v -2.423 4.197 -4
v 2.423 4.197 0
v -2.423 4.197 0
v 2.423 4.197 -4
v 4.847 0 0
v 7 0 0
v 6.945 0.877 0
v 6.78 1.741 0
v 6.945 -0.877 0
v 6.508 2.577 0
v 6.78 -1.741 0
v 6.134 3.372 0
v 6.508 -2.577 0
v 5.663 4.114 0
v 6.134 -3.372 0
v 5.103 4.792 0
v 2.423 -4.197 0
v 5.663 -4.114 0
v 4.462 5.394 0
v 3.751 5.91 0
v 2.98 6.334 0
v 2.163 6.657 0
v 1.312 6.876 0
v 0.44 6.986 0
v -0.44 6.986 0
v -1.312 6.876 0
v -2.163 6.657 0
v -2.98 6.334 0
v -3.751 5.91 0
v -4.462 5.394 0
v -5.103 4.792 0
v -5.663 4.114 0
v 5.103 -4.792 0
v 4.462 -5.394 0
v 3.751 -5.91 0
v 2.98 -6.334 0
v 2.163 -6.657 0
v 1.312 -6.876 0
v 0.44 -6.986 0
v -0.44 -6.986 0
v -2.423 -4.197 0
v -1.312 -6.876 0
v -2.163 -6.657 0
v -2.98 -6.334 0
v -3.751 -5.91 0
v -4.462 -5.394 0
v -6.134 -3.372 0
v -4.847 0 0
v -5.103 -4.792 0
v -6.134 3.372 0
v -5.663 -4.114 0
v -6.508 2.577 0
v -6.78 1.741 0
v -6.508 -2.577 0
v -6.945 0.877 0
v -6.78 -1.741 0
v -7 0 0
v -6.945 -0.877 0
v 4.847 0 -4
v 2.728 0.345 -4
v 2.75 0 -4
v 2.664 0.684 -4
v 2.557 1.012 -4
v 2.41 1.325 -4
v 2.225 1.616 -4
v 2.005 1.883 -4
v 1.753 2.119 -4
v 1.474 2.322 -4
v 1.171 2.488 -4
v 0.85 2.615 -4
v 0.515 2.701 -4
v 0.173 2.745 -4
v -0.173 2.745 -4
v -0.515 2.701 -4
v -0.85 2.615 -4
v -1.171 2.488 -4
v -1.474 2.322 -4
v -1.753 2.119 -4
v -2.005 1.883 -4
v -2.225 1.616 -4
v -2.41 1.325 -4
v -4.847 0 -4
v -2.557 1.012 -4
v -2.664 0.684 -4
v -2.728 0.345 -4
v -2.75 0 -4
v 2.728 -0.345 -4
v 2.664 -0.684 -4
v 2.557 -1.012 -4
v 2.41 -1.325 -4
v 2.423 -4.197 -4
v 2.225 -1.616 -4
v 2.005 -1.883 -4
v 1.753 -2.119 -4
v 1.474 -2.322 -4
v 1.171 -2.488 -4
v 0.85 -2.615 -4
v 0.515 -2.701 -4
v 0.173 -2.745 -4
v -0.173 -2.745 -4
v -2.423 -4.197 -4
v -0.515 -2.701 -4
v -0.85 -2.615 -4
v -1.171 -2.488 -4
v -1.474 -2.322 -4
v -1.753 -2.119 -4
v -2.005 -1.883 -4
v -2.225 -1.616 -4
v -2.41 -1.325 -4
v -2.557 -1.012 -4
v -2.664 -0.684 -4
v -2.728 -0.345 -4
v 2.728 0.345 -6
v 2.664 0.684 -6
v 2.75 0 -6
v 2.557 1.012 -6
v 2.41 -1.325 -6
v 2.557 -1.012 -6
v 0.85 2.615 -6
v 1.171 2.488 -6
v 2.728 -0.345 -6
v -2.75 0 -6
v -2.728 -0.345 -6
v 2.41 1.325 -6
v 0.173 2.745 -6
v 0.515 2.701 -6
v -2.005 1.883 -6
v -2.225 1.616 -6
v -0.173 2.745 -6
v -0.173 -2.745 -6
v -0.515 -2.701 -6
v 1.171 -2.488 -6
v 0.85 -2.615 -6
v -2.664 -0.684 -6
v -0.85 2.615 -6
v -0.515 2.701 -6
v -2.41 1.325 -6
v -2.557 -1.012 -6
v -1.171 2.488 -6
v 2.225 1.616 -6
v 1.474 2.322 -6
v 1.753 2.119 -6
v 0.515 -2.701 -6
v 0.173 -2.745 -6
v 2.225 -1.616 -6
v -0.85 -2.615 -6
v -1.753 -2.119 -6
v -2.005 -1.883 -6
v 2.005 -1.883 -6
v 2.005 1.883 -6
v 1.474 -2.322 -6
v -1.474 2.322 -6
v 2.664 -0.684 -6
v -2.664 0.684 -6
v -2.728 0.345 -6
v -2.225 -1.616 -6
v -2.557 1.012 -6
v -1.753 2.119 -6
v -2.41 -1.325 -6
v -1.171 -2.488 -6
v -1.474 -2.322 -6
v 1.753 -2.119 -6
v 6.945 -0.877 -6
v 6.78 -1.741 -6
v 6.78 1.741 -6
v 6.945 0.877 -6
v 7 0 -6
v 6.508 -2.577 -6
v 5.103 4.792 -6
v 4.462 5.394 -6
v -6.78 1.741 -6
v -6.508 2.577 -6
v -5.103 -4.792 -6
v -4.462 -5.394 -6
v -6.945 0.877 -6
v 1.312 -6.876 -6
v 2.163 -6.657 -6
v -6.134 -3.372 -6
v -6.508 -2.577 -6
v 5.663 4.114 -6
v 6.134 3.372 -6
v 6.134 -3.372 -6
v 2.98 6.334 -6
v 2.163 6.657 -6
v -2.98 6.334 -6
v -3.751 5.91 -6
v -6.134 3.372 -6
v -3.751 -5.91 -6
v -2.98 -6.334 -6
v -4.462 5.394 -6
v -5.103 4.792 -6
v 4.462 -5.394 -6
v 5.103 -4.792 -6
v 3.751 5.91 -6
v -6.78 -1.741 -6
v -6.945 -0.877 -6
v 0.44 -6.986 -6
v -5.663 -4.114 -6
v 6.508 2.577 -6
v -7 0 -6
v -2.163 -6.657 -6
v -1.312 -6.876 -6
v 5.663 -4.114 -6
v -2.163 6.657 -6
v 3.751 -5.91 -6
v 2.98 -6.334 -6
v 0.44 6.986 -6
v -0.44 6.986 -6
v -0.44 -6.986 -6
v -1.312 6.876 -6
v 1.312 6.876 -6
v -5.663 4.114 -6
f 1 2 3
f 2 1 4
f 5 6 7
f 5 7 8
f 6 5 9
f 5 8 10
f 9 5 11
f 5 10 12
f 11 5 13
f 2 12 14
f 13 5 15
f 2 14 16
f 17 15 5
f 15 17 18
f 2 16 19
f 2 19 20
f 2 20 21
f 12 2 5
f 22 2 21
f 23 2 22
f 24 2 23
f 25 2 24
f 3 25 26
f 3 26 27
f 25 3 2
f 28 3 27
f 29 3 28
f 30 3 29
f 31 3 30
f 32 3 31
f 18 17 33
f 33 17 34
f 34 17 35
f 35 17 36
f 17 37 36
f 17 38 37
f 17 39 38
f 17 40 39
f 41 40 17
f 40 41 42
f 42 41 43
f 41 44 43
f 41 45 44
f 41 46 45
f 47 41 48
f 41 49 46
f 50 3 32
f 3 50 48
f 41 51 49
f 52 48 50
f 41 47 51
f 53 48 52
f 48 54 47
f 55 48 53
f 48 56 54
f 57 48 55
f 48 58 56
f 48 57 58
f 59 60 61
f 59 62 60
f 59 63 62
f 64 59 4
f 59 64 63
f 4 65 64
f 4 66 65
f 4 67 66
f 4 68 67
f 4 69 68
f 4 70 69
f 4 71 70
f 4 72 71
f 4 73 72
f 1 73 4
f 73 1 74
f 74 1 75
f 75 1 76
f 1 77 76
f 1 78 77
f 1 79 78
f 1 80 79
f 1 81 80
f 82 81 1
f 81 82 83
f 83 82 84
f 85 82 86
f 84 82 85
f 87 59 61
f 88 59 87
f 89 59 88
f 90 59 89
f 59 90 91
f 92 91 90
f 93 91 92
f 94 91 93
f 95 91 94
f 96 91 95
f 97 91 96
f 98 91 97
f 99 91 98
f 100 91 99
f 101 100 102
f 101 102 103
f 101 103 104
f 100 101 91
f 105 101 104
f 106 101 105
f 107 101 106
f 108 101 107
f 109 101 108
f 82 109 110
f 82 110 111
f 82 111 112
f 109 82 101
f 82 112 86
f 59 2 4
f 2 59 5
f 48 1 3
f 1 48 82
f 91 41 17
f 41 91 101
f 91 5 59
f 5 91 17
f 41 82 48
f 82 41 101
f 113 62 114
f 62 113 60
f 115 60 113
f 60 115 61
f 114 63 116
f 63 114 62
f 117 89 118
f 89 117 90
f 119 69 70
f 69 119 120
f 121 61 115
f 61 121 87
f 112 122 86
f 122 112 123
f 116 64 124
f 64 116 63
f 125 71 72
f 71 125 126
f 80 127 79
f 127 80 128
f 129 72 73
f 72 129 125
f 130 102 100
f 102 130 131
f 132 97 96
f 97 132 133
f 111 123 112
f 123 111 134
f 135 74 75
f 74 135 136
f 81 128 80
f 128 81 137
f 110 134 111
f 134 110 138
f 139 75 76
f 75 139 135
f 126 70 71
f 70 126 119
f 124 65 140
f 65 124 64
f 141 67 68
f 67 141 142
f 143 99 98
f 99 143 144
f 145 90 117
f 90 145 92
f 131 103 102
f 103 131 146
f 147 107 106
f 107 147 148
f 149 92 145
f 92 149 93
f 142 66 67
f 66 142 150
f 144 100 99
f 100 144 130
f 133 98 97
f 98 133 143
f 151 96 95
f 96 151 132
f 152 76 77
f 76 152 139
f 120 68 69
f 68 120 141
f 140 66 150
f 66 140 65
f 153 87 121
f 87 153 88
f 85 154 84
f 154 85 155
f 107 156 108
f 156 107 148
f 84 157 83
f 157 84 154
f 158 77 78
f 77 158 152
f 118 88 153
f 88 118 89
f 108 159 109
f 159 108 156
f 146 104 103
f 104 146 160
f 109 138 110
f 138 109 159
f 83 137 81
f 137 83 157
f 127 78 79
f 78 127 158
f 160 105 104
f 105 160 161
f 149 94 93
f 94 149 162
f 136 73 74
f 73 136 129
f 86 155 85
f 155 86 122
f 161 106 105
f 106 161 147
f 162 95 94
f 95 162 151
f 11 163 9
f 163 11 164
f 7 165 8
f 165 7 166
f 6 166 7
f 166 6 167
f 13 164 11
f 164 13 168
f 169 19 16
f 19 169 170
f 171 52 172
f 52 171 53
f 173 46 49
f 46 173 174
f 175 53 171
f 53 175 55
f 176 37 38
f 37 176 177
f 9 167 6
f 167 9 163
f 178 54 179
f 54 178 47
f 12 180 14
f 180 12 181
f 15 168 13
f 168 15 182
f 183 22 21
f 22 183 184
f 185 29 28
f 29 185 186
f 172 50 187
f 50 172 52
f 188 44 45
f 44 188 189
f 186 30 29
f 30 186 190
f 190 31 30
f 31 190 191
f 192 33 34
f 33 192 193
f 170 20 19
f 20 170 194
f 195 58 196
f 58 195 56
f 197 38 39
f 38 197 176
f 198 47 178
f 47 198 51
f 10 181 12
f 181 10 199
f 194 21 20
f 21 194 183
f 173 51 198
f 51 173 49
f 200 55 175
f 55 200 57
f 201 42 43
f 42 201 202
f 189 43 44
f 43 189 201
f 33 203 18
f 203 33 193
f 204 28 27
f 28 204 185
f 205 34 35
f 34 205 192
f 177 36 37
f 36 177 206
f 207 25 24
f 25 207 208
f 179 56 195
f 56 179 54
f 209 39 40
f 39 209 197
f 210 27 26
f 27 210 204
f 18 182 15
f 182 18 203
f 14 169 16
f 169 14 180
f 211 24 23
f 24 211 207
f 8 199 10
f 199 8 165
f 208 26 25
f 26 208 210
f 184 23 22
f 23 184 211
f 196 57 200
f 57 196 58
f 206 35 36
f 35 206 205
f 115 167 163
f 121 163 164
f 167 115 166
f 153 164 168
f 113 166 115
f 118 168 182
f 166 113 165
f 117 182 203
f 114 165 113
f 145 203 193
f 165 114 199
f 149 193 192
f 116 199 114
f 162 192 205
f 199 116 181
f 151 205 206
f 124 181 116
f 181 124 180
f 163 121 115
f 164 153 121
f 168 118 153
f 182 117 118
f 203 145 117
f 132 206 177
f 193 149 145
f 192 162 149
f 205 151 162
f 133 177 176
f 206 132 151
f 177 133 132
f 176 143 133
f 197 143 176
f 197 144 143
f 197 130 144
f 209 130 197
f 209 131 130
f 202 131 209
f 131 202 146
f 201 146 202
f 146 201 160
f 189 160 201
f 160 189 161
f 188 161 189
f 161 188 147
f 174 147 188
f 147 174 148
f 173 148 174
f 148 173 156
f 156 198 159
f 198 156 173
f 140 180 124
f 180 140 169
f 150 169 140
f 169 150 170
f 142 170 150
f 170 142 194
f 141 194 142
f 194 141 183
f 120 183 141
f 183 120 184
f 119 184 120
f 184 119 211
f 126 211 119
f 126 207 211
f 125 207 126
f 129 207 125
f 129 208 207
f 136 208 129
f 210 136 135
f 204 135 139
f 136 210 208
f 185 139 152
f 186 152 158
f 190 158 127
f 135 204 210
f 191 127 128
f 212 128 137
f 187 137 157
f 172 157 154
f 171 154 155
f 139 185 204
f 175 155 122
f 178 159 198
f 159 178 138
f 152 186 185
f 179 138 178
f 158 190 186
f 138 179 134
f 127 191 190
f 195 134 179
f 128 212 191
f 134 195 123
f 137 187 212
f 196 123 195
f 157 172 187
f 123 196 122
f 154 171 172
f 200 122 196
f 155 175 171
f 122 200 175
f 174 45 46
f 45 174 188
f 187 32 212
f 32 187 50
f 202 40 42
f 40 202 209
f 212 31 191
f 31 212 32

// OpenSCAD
$fn = 50;


difference() {
	union() {
		translate(v = [0, 0, -6.0000000000]) {
			cylinder(h = 6.0000000000, r = 7.0000000000);
		}
	}
	union() {
		translate(v = [0, 0, 0]) {
			rotate(a = [0, 0, 0]) {
				difference() {
					union() {
						translate(v = [0, 0, -4]) {
							linear_extrude(height = 4) {
								polygon(points = [[4.8468000000, 0.0000000000], [2.4234000000, 4.1974519271], [-2.4234000000, 4.1974519271], [-4.8468000000, 0.0000000000], [-2.4234000000, -4.1974519271], [2.4234000000, -4.1974519271]]);
							}
						}
					}
					union();
				}
			}
		}
		#translate(v = [0, 0, -100.0000000000]) {
			cylinder(h = 200, r = 2.7500000000);
		}
	}
}
